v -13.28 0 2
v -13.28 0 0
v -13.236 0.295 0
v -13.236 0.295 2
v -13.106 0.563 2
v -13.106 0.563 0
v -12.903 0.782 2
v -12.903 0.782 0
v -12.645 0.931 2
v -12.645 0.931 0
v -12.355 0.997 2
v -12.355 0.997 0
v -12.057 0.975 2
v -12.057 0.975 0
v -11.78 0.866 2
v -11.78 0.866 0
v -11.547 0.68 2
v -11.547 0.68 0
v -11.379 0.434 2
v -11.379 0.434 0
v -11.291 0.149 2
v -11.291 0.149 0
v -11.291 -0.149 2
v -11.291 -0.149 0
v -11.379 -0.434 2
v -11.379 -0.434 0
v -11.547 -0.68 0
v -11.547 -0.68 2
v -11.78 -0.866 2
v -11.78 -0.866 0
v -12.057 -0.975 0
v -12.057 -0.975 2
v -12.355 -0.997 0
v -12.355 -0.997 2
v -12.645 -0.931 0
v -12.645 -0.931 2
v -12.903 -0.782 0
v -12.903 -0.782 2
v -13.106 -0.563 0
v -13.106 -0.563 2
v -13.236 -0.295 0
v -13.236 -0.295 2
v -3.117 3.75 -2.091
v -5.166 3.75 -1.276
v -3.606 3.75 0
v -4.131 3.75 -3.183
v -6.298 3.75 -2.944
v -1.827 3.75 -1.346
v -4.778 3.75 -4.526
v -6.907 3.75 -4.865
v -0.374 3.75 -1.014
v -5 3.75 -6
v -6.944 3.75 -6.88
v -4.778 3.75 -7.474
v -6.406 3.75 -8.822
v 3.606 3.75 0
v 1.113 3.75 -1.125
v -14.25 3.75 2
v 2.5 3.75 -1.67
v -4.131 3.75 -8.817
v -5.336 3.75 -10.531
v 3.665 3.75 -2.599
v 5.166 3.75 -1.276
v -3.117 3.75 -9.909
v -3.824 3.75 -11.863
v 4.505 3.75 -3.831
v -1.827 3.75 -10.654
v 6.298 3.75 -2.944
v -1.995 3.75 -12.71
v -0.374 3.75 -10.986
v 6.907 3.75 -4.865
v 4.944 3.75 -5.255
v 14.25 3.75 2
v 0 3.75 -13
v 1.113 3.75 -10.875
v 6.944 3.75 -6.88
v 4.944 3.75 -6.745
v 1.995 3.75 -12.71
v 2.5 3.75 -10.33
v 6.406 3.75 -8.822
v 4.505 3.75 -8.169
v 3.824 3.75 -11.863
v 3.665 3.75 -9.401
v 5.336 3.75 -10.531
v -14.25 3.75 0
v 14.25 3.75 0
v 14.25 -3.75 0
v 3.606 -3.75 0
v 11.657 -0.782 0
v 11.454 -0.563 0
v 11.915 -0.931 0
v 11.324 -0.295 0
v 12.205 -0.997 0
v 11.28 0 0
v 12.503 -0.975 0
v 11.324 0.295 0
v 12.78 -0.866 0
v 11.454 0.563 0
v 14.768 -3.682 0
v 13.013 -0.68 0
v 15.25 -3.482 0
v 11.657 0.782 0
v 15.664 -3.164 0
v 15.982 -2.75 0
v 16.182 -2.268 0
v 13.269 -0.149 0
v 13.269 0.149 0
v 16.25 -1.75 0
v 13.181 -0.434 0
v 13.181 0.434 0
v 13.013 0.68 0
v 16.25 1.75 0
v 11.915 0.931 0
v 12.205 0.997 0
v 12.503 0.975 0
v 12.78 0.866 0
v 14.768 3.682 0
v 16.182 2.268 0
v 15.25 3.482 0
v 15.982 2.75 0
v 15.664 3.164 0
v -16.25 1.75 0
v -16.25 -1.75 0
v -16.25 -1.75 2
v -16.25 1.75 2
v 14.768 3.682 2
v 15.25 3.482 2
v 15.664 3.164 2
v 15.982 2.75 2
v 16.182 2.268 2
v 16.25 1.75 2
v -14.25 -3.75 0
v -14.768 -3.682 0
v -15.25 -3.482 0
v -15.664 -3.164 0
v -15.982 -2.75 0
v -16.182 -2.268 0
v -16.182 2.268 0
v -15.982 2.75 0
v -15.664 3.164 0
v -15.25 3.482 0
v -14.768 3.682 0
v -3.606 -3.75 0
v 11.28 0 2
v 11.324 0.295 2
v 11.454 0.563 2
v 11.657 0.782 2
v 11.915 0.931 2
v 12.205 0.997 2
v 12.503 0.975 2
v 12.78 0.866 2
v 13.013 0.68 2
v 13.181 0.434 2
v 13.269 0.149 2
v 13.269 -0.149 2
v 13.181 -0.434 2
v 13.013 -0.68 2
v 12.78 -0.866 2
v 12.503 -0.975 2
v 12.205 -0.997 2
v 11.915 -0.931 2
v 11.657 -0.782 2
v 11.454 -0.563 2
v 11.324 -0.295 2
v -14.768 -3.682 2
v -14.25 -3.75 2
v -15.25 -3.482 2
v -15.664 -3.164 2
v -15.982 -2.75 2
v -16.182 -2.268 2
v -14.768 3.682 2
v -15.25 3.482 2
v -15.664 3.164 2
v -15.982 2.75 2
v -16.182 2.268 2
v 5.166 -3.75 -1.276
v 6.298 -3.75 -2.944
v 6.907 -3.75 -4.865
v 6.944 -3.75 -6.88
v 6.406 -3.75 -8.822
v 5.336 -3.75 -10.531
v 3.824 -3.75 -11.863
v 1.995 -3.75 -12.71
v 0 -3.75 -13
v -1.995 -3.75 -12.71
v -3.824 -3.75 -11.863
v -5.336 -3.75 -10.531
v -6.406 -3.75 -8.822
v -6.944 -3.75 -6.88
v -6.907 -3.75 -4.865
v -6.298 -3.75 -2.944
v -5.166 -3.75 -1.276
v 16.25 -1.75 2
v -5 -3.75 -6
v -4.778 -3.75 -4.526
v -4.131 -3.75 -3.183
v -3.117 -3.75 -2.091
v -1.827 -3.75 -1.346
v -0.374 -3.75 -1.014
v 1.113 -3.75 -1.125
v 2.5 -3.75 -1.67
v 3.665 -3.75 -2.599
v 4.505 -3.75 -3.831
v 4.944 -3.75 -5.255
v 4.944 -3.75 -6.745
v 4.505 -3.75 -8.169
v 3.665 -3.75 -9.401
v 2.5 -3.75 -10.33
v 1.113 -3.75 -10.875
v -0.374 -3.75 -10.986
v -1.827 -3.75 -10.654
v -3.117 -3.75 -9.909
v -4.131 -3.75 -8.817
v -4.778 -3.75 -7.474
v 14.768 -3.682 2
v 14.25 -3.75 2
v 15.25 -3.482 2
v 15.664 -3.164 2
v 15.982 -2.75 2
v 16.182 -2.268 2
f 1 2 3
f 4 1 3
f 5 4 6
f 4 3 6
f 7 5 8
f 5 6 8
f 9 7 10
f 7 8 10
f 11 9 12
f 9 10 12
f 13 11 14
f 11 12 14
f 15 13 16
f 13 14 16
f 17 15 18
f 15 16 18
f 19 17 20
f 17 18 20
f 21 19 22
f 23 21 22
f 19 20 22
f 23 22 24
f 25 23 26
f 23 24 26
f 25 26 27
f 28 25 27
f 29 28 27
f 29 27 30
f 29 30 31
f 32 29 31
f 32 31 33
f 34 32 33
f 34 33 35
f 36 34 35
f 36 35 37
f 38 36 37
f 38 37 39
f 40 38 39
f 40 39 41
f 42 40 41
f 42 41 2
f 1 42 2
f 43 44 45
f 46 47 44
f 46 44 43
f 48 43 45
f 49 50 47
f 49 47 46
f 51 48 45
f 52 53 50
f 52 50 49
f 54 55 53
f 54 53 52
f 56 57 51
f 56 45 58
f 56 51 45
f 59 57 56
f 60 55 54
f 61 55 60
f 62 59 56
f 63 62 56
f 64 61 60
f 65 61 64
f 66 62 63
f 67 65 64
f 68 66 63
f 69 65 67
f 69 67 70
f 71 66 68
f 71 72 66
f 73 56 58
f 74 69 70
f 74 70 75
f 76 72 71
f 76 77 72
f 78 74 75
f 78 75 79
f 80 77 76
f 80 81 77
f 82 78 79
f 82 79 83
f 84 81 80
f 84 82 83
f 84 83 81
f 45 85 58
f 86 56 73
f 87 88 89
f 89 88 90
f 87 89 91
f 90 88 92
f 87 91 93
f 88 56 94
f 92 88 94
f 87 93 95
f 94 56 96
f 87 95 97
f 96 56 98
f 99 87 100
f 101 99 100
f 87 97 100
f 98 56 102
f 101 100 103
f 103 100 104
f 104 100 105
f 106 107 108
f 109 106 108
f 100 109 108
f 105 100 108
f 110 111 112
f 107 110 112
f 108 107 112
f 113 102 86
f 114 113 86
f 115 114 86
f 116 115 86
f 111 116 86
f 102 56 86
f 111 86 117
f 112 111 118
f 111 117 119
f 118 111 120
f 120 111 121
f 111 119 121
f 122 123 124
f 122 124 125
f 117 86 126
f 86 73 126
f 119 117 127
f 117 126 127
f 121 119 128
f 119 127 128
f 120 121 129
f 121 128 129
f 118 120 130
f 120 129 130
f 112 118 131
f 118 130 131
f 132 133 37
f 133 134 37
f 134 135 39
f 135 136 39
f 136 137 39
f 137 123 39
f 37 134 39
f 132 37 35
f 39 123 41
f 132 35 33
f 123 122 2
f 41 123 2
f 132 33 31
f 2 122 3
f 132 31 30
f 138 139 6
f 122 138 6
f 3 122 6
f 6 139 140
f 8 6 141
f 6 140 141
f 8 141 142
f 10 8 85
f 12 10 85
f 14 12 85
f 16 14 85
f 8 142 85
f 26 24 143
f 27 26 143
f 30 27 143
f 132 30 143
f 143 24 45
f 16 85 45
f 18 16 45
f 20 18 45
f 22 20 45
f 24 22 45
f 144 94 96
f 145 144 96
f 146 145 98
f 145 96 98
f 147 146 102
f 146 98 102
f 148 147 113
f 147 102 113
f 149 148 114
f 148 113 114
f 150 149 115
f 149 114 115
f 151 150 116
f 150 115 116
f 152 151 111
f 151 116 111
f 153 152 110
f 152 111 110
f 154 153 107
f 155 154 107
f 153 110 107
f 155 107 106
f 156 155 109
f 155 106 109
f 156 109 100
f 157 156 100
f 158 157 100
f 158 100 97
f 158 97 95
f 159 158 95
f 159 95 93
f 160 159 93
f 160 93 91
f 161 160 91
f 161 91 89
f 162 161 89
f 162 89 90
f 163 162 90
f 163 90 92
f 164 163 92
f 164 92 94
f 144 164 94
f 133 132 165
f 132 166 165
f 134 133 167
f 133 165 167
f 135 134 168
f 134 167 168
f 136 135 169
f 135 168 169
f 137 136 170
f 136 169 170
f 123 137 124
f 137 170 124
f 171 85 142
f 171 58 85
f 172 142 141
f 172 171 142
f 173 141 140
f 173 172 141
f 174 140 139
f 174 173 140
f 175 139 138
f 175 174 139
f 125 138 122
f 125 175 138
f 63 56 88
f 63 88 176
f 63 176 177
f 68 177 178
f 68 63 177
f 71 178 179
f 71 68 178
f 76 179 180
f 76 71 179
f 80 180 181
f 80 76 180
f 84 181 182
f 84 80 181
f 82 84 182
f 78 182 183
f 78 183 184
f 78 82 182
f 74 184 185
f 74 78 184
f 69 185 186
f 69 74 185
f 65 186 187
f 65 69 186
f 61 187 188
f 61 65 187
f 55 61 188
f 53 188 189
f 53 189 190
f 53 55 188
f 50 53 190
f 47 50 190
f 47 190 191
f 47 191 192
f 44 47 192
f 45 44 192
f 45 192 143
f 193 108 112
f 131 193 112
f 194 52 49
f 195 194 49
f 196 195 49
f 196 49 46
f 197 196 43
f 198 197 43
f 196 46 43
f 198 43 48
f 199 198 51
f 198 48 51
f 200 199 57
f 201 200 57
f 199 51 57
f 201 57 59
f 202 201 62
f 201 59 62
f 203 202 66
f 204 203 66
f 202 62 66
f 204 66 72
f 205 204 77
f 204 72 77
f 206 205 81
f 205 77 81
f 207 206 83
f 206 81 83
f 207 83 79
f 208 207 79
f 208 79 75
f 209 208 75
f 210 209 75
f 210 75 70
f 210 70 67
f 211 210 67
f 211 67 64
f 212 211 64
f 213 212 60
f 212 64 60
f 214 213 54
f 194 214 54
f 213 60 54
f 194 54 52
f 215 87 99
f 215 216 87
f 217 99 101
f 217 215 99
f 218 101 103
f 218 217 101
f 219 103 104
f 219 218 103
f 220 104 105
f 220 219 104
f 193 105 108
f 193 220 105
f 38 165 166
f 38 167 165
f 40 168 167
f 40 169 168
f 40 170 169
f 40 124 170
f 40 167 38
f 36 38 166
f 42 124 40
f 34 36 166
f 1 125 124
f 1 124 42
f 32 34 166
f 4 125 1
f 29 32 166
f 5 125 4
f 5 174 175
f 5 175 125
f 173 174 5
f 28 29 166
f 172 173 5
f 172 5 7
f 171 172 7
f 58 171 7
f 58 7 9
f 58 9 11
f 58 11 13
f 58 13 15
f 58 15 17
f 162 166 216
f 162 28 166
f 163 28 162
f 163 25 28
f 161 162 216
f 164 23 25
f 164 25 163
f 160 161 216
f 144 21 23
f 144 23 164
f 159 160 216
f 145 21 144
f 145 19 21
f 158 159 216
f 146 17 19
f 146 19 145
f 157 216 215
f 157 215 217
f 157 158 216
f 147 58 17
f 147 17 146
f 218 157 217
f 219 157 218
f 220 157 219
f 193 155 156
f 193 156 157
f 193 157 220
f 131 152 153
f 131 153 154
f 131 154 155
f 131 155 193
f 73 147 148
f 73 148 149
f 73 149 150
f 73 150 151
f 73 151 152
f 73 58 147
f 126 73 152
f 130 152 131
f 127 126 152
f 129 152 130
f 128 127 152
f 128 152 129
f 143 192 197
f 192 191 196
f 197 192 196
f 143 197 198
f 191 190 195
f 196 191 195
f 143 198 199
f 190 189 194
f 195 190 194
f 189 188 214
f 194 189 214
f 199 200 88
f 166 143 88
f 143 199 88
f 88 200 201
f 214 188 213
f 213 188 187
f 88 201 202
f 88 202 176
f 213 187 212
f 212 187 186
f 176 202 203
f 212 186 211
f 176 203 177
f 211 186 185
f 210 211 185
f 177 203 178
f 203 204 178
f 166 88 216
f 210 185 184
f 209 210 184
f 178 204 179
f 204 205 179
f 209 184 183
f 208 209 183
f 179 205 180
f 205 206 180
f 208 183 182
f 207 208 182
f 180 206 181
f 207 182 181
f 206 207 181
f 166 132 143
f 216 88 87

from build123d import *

# Parameters (mm, degrees)
SKETCH1_W           = 32.5
SKETCH1_H           = 7.5
BOSS_EXTRUDE1_DEPTH = 2
SKETCH2_R           = 7
SKETCH2_R_2         = 5
BOSS_EXTRUDE2_DEPTH = 7.5
SKETCH3_R           = 1
CUT_EXTRUDE1_DEPTH  = 3.18
FILLET1_R           = 2


with BuildPart() as part:
    # Sketch1 → Boss-Extrude1 (new body)
    with BuildSketch(Plane.XY):
        Rectangle(SKETCH1_W, SKETCH1_H)
    extrude(amount=BOSS_EXTRUDE1_DEPTH)

    # Sketch2 → Boss-Extrude2 (add)
    with BuildSketch(Plane(origin=(0, 3.75, 0), x_dir=(1, 0, 0), z_dir=(0, 1, 0))):
        with Locations((0, 6)):
            Circle(SKETCH2_R)
        with Locations(Location((0, 6, 0), (0, 0, 180))):
            Circle(SKETCH2_R_2, mode=Mode.SUBTRACT)
    extrude(amount=-BOSS_EXTRUDE2_DEPTH)

    # Sketch3 → Cut-Extrude1 (cut)
    with BuildSketch(Plane(origin=(0, 0, 0), x_dir=(-1, 0, 0), z_dir=(0, 0, -1))):
        with Locations((-12.28, 0)):
            Circle(SKETCH3_R)
        with Locations((12.28, 0)):
            Circle(SKETCH3_R)
    extrude(amount=-CUT_EXTRUDE1_DEPTH, mode=Mode.SUBTRACT)

    # Fillet1
    fillet1_edges = [part.edges().sort_by_distance(p)[0] for p in [
        (-16.25, 3.75, 1),
        (16.25, 3.75, 1),
        (16.25, -3.75, 1),
        (-16.25, -3.75, 1),
    ]]
    fillet(fillet1_edges, radius=FILLET1_R)


solid = part.part
